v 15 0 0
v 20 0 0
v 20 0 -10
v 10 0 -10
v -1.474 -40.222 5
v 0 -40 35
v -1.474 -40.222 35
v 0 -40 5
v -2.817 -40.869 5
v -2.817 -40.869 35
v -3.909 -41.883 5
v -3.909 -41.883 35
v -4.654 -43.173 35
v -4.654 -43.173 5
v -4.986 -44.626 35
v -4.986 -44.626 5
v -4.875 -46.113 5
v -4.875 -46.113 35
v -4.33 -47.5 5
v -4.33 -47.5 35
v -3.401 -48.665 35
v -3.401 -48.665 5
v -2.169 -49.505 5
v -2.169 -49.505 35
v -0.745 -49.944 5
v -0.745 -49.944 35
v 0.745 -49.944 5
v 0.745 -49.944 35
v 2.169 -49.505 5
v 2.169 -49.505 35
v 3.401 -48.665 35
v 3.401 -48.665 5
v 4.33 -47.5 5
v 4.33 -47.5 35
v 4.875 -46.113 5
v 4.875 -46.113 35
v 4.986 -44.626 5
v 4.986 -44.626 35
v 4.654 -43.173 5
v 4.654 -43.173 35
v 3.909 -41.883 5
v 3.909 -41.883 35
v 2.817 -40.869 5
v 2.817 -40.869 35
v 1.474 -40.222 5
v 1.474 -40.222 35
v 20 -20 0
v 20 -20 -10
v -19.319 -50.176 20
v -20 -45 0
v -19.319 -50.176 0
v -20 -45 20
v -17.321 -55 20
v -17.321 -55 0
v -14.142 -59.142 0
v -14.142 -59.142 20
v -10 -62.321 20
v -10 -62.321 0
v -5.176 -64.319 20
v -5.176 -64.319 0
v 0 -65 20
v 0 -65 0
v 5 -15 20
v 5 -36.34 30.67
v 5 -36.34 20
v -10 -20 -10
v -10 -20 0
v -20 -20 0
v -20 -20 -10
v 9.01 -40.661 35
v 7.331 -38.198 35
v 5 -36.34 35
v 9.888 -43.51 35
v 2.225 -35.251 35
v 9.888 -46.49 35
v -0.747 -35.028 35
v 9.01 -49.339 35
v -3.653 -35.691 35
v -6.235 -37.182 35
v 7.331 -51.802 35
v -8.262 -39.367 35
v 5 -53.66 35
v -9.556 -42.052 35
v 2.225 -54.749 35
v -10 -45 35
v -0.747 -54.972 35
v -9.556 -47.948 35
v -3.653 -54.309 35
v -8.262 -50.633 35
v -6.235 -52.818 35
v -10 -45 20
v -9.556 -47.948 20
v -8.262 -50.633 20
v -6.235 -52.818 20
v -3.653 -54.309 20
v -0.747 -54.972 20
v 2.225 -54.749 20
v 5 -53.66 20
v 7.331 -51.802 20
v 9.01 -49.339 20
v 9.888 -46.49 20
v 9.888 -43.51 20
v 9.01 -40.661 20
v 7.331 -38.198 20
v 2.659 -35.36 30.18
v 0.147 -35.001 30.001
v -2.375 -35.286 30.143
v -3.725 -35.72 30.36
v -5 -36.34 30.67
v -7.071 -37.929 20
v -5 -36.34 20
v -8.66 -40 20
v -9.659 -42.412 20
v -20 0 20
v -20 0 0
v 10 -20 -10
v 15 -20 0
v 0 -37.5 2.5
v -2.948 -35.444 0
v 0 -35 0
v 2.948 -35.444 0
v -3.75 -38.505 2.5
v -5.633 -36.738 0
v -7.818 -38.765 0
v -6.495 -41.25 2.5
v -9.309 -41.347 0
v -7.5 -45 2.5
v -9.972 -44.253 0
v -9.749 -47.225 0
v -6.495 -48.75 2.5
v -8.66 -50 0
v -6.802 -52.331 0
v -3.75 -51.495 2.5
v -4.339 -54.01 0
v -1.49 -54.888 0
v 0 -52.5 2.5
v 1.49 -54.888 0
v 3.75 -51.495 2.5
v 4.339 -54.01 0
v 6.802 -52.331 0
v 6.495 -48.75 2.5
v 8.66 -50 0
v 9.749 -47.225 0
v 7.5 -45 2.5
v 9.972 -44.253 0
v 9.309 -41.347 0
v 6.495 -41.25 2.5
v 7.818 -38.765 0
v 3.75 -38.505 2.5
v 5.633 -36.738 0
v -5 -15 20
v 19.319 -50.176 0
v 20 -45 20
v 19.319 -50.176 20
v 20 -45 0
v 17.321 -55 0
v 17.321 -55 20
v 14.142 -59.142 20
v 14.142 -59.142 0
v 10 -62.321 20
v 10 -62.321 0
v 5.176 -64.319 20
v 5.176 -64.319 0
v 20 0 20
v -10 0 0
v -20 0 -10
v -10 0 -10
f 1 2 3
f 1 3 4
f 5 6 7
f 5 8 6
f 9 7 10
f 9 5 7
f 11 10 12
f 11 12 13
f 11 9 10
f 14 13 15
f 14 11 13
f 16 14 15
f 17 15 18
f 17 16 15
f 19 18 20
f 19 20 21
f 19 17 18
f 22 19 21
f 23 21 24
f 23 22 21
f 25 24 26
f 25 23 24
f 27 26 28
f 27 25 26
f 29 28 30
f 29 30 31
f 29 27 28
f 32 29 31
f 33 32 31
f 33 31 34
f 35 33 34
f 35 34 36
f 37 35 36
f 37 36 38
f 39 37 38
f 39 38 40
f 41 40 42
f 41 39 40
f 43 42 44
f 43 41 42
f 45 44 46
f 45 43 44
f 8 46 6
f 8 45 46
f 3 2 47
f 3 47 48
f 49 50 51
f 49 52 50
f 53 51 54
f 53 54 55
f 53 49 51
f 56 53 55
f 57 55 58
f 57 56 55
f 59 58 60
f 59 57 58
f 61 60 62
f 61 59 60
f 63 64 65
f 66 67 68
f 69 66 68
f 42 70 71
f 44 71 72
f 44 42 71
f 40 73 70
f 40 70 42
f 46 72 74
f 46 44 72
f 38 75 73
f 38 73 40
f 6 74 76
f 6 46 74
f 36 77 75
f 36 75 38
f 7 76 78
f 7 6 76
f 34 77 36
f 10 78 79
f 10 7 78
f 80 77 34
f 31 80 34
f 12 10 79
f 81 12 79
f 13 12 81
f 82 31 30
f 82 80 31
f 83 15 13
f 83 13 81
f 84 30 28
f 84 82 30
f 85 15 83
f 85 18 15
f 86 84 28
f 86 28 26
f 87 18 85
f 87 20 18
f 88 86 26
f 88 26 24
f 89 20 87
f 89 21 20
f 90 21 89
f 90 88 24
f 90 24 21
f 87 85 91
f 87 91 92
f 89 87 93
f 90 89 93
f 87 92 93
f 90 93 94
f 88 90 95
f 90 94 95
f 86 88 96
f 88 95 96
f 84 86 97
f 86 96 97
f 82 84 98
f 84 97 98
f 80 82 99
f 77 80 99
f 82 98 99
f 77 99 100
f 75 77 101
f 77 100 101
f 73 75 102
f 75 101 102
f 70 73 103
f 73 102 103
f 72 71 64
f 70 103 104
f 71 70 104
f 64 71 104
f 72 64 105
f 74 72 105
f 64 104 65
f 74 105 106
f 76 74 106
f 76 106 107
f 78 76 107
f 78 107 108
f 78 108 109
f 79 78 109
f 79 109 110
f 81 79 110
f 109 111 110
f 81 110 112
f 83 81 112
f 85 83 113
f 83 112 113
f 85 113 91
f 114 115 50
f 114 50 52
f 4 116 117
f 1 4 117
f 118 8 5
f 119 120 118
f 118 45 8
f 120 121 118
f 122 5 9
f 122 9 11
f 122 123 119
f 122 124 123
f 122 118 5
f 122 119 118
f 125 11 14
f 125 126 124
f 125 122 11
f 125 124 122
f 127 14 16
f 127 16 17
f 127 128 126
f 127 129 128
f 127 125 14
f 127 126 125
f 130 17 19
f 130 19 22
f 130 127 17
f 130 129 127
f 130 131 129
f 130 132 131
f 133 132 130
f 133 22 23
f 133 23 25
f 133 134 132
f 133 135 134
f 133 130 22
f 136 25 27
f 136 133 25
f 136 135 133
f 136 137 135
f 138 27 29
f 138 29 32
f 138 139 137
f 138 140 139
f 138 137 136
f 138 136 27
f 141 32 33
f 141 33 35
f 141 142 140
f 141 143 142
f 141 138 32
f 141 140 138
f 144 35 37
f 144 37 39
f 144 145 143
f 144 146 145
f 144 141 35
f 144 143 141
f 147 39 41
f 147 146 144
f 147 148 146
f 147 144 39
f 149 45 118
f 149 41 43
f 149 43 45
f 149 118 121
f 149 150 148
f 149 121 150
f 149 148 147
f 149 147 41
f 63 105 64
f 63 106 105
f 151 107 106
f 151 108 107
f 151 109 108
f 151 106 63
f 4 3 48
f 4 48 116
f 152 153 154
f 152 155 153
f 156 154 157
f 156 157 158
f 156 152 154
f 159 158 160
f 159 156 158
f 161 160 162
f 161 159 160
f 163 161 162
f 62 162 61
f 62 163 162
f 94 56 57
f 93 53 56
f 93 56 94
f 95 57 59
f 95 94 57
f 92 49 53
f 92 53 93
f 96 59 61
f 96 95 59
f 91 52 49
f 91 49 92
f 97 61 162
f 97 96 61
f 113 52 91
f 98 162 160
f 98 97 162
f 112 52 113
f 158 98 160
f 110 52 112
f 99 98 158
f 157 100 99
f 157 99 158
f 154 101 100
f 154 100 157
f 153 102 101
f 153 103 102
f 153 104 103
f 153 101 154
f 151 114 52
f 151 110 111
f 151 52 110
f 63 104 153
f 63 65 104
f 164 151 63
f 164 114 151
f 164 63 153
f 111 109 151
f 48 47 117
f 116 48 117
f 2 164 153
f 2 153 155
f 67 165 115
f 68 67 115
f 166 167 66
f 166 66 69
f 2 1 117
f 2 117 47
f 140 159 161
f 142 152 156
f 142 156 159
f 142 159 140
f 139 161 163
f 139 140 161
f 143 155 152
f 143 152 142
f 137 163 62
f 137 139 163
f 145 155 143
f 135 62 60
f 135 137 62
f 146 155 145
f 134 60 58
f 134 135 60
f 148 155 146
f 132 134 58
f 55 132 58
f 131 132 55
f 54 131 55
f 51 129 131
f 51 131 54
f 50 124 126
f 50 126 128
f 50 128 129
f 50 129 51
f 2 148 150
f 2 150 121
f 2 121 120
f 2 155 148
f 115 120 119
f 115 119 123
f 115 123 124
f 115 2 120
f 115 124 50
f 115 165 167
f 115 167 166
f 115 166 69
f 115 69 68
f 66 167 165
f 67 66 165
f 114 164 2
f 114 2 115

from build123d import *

# Parameters (mm, degrees)
BOSS_EXTRUDE1_DEPTH   = 65
BOSS_EXTRUDE2_DEPTH   = 20
SKETCH1_4_W           = 10
SKETCH1_4_H           = 10
BOSS_EXTRUDE2_2_DEPTH = 20
FILLET1_R             = 20
SKETCH3_R             = 10
BOSS_EXTRUDE3_DEPTH   = 15
RIB3_REACH            = 78.485
SKETCH5_WALL_W        = 177.331265182
SKETCH5_WALL_H        = 10


with BuildPart() as part:
    # Sketch1 → Boss-Extrude1 (new body)
    with BuildSketch(Plane(origin=(0, 0, 0), x_dir=(-1, 0, 0), z_dir=(0, 1, 0))):
        Polygon((0, 20), (0, 0), (10, 0), (20, 0), (20, 20), align=None)
        Polygon((-15, 0), (0, 0), (0, 20), (-20, 20), (-20, 0), align=None)
    extrude(amount=-BOSS_EXTRUDE1_DEPTH)

    # Fillet1
    fillet1_edges = [part.edges().sort_by_distance(p)[0] for p in [
        (-20, -65, 10),
        (20, -65, 10),
    ]]
    fillet(fillet1_edges, radius=FILLET1_R - 0.0001)  # a hair under: the kernel refuses the full size

    # Sketch3 → Boss-Extrude3 (add)
    with BuildSketch(Plane.XY.offset(20)):
        with Locations(Location((0, -45, 0), (0, 0, 180))):
            Circle(SKETCH3_R)
    extrude(amount=BOSS_EXTRUDE3_DEPTH)

    # Sketch5 wall → Rib3 (add, up to next)
    with BuildSketch(Plane(origin=(0, -25, 25), x_dir=(0, 0.894427191, -0.4472135955), z_dir=(0, 0.4472135955, 0.894427191)), mode=Mode.PRIVATE) as rib3_sk1:
        Rectangle(SKETCH5_WALL_W, SKETCH5_WALL_H)
    rib3_tool1 = extrude(rib3_sk1.sketch, amount=-RIB3_REACH, mode=Mode.PRIVATE) - part.part
    add(rib3_tool1.solids().sort_by_distance((0, -25, 25))[0])

    # Sketch8 → Ø10.0 (10) Diameter Hole1 (revolve, cut)
    with BuildSketch(Plane(origin=(0, -45, 0), x_dir=(0, 1, 0), z_dir=(1, 0, 0))):
        Polygon((0, 0), (0, 35), (5, 35), (5, 5), (10, 0), align=None)
    revolve(axis=Axis((0, -45, -6.35), (0, 0, 1)), mode=Mode.SUBTRACT)


with BuildPart() as body_2:
    # Sketch1<4> → Boss-Extrude2 (new body)
    with BuildSketch(Plane(origin=(0, 0, 0), x_dir=(-1, 0, 0), z_dir=(0, 1, 0))):
        Polygon((-10, -10), (-15, 0), (-20, 0), (-20, -10), align=None)
    extrude(amount=-BOSS_EXTRUDE2_DEPTH)


with BuildPart() as body_3:
    # Sketch1<4> → Boss-Extrude2 2 (new body)
    with BuildSketch(Plane(origin=(0, 0, 0), x_dir=(-1, 0, 0), z_dir=(0, 1, 0))):
        with Locations((15, -5)):
            Rectangle(SKETCH1_4_W, SKETCH1_4_H)
    extrude(amount=-BOSS_EXTRUDE2_2_DEPTH)


solid = Compound([part.part, body_2.part, body_3.part])
